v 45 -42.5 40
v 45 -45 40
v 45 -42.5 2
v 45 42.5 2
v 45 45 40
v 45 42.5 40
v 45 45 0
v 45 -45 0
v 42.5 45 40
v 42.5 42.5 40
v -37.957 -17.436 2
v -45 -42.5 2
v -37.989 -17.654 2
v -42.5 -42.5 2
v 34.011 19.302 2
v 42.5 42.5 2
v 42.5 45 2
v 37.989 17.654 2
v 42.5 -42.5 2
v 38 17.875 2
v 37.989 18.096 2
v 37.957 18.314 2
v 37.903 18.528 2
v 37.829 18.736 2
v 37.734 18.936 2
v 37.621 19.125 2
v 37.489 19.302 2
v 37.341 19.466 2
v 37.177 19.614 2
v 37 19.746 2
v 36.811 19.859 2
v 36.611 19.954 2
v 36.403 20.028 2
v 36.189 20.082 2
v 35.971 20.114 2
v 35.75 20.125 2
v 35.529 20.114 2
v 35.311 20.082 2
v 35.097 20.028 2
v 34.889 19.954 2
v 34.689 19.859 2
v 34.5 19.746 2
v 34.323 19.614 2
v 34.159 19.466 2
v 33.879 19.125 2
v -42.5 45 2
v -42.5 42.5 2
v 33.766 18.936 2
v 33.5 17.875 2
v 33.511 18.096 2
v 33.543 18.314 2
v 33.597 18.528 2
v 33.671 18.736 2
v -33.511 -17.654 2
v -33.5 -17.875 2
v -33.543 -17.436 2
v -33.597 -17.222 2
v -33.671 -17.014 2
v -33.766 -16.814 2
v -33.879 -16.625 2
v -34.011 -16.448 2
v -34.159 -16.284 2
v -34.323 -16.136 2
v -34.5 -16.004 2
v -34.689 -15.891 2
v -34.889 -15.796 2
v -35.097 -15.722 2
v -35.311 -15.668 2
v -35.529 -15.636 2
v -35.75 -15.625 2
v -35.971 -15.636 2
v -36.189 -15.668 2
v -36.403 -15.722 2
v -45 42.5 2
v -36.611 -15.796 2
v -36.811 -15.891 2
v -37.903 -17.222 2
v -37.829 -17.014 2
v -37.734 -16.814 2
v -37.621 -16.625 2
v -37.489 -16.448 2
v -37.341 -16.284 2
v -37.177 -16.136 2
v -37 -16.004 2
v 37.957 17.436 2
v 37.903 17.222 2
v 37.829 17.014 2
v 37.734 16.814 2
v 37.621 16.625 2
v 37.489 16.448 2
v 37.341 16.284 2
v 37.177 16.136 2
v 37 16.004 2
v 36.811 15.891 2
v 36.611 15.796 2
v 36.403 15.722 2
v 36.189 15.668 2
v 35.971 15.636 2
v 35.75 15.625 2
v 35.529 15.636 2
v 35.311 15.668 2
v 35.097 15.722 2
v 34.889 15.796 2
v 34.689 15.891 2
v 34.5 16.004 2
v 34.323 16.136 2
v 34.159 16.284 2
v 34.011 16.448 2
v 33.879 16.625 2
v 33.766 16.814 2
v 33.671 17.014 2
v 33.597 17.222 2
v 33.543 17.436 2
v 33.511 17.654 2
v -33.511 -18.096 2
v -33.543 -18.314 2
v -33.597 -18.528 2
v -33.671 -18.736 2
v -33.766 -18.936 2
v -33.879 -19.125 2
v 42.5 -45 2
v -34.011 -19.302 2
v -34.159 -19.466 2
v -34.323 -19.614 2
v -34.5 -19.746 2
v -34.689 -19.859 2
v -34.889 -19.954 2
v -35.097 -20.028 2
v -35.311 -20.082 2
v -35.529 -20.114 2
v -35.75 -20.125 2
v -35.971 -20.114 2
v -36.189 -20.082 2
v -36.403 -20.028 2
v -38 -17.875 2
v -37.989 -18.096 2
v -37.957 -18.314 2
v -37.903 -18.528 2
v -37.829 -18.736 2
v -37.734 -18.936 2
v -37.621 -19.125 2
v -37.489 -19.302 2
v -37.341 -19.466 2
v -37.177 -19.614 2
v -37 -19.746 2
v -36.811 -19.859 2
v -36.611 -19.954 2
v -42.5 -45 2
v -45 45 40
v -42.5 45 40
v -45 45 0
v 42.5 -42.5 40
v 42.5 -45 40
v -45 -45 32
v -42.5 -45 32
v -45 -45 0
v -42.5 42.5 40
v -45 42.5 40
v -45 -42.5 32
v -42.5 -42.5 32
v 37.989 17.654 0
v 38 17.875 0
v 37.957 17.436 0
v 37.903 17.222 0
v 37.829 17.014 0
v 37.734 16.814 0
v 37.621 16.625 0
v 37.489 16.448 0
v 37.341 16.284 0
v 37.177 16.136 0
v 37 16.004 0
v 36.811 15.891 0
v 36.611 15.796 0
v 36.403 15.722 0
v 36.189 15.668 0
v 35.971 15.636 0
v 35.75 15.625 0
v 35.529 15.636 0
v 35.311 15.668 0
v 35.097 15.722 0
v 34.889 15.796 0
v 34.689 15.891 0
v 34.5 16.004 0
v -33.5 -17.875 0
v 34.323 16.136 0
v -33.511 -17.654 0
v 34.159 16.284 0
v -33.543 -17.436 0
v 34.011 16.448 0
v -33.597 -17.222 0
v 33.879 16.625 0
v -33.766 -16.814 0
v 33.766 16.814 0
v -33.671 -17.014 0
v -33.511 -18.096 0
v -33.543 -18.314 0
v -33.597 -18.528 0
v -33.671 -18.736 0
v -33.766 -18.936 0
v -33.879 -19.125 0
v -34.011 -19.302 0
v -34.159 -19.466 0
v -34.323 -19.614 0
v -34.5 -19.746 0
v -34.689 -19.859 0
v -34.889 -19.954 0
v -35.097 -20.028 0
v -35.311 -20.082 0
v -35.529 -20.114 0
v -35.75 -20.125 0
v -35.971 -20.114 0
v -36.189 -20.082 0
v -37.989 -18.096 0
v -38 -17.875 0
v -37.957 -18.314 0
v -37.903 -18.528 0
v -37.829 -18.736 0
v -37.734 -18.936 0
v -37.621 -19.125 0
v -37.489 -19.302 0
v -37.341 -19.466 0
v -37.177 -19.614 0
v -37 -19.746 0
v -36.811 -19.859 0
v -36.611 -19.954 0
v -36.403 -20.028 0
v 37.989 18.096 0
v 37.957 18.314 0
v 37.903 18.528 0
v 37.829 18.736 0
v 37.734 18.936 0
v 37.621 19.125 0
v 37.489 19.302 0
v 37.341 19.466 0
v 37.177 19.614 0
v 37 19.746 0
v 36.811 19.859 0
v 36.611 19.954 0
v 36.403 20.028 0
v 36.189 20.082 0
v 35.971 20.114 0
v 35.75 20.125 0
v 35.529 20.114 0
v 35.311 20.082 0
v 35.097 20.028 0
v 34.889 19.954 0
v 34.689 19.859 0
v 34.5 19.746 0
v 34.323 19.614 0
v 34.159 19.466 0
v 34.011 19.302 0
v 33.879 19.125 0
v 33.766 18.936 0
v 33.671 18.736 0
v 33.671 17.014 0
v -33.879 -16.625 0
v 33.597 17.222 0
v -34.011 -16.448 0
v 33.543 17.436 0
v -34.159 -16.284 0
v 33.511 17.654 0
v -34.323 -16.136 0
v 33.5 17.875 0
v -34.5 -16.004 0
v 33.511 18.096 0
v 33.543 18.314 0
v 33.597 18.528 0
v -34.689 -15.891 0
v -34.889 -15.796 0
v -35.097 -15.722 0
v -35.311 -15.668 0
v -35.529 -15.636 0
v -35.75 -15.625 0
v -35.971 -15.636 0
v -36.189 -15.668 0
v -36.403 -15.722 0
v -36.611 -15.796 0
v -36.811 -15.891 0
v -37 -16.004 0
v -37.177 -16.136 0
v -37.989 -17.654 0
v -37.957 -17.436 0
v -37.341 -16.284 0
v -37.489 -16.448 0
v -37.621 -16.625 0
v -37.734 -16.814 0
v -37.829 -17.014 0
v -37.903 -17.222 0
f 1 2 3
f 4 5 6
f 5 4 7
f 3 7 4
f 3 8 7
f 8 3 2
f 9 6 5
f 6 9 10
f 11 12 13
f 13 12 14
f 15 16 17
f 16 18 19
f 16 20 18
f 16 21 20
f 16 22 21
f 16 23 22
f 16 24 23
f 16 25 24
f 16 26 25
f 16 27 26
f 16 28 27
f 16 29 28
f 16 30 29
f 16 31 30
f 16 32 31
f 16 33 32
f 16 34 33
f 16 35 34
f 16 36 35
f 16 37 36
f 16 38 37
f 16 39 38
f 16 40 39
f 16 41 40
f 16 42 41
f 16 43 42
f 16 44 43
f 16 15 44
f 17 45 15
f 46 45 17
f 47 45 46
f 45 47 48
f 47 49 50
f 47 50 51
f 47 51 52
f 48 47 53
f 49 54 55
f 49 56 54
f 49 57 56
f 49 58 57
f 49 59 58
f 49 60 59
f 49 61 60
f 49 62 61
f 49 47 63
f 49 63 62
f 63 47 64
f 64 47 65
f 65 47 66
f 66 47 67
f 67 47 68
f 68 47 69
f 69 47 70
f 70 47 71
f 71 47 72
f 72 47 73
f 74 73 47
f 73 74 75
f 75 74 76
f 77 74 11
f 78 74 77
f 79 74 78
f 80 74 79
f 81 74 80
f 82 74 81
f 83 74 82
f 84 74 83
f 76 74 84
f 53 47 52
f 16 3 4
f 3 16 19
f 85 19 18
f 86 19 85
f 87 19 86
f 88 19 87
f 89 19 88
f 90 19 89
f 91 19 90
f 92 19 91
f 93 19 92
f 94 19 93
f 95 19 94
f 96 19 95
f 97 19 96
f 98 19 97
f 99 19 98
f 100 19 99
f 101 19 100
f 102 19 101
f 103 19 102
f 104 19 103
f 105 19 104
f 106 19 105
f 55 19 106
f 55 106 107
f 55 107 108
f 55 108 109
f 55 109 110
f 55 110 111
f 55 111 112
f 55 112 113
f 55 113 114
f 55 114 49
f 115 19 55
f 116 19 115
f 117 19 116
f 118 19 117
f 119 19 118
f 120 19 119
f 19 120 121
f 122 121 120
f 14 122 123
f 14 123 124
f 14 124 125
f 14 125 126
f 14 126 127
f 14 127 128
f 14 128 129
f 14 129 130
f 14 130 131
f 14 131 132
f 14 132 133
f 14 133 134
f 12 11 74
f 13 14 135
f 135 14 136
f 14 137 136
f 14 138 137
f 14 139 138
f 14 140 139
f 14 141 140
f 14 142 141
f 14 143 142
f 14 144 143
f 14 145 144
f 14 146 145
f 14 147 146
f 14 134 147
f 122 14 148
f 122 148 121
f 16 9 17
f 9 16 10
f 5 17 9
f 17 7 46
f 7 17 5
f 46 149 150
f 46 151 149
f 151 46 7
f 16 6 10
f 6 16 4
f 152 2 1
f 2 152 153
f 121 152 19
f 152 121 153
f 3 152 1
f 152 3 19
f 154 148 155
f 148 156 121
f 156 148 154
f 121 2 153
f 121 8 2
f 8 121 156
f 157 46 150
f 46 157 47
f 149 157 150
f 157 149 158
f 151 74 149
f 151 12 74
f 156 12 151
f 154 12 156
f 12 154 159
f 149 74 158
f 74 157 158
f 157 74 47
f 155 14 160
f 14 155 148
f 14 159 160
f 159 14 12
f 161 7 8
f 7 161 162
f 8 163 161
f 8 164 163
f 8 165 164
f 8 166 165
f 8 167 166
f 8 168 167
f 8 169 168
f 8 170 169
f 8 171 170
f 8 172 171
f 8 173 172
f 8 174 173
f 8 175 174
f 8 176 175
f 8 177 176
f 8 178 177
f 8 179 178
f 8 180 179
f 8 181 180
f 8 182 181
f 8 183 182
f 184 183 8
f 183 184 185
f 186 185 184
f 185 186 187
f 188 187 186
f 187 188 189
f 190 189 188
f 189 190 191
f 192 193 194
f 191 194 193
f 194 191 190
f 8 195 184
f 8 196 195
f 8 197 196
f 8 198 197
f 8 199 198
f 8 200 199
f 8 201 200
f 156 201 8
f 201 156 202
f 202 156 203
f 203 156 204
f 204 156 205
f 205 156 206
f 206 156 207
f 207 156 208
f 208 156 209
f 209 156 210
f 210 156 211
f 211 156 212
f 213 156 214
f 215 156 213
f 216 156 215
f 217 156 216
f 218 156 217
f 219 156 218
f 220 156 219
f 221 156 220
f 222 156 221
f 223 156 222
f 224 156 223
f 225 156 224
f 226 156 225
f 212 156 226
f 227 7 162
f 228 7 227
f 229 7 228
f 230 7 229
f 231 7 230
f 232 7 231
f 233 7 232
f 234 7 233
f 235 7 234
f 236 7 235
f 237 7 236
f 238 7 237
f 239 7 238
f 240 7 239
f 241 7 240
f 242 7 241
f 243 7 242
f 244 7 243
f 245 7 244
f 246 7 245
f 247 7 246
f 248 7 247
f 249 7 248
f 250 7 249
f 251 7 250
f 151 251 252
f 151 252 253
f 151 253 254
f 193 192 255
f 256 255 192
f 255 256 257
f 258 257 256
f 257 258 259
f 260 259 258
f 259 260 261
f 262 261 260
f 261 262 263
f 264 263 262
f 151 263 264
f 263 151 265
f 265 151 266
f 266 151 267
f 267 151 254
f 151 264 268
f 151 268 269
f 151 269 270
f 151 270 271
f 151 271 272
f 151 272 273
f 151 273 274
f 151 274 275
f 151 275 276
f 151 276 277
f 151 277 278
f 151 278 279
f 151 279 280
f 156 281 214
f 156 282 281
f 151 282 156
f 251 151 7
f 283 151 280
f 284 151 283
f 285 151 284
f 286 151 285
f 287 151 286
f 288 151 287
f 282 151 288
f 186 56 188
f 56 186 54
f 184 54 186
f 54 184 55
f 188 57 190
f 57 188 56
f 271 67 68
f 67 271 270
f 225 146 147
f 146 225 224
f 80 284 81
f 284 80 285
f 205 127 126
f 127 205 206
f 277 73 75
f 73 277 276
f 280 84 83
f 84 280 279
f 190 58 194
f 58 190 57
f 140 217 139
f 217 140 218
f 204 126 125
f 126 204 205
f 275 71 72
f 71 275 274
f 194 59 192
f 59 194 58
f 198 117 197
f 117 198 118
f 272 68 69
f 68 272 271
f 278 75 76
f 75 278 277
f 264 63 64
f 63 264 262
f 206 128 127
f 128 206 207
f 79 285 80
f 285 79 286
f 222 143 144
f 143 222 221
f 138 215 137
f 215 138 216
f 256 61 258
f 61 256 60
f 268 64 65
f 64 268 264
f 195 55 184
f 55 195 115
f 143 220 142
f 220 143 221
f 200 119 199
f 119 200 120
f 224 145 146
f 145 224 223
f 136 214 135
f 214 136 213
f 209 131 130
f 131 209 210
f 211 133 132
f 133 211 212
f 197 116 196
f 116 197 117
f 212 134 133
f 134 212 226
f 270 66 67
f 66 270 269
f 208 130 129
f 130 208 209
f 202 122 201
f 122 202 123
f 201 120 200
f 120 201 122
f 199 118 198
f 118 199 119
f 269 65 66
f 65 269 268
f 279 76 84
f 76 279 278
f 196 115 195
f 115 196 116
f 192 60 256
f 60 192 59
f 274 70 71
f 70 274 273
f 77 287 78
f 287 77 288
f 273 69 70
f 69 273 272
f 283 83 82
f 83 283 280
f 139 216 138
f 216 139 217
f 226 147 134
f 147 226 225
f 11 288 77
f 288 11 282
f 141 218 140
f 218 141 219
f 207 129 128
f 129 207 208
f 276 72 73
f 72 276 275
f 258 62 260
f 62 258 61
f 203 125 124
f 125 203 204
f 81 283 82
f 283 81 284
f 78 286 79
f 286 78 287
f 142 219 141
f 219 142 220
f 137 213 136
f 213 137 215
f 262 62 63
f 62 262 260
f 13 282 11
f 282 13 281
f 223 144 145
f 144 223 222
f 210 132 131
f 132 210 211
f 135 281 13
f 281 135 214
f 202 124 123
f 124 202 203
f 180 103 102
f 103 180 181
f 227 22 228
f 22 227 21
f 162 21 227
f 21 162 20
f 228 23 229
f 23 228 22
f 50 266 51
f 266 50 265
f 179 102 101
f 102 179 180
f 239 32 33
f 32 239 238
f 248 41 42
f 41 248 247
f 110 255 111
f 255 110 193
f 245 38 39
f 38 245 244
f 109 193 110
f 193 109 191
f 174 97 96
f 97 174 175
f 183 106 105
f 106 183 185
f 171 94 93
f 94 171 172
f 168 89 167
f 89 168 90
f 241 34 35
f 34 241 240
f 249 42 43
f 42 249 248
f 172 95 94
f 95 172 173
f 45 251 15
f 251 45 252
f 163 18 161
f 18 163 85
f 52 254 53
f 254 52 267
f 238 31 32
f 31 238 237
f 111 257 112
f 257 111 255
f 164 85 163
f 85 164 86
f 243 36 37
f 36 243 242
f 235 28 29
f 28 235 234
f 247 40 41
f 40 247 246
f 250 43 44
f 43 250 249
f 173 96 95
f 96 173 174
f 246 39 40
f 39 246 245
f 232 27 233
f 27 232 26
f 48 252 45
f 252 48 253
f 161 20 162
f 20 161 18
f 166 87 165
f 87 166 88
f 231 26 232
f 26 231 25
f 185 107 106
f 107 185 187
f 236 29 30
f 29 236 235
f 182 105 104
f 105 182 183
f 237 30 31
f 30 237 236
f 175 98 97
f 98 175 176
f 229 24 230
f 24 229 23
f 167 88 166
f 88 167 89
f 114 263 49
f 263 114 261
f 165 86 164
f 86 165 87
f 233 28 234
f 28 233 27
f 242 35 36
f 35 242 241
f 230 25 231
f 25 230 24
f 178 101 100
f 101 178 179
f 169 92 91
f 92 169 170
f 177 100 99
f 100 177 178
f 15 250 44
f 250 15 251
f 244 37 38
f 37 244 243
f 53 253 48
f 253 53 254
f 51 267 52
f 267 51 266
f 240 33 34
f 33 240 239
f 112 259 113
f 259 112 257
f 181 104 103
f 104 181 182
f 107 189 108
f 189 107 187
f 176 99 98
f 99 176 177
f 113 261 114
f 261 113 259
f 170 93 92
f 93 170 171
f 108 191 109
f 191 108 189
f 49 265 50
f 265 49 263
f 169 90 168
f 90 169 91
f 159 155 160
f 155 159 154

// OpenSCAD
// DIY magnetic stirrer housing for 80 mm PC case fan
// Print orientation: top plate on bed (z = 0), walls build upward (+Z)

$fn = 64;

// ---- Dimensions (mm) ----
plate_thickness   = 2;     // top plate thickness (z = 0 to 2)
wall_thickness    = 2.5;   // side walls thickness (z = 2 to 40)
box_height        = 40;    // outer top of walls (z = 40)
outer_size        = 90;    // outer X and Y size of box
hole_size         = 4.5;   // M4 screw holes diameter
hole_pattern      = 71.5;  // square pitch of screw holes
notch_width       = 12;    // cable notch width in wall
notch_depth       = 8;     // cable notch depth from open edge (z = 32 to 40)
eps               = 0.5;   // cutter overshoot past faces

// ---- Model ----
difference() {
    union() {
        // Top plate
        translate([-outer_size/2, -outer_size/2, 0])
            cube([outer_size, outer_size, plate_thickness]);

        // Four side walls, rising from top plate to open top
        for (sx = [-1, 1], sy = [-1, 1])
            translate([sx > 0 ? -outer_size/2 : outer_size/2 - wall_thickness,
                       sy > 0 ? -outer_size/2 : outer_size/2 - wall_thickness,
                       plate_thickness])
                cube([wall_thickness, wall_thickness, box_height - plate_thickness]);
    }

    // Screw holes through top plate on 71.5 mm square pattern
    for (i = [0 : 3]) {
        x = (i % 2 - 0.5) * hole_pattern;
        y = (i / 2 - 0.25) * hole_pattern;
        translate([x, y, -eps])
            cylinder(d = hole_size, h = plate_thickness + 2*eps);
    }

    // Cable notch in one wall, 12 mm wide, reaching 8 mm down from open edge
    translate([-outer_size/2 + wall_thickness - notch_width/2,
               -outer_size/2 + wall_thickness - notch_width/2,
               box_height - notch_depth])
        cube([notch_width, notch_width, notch_depth + eps]);
}
